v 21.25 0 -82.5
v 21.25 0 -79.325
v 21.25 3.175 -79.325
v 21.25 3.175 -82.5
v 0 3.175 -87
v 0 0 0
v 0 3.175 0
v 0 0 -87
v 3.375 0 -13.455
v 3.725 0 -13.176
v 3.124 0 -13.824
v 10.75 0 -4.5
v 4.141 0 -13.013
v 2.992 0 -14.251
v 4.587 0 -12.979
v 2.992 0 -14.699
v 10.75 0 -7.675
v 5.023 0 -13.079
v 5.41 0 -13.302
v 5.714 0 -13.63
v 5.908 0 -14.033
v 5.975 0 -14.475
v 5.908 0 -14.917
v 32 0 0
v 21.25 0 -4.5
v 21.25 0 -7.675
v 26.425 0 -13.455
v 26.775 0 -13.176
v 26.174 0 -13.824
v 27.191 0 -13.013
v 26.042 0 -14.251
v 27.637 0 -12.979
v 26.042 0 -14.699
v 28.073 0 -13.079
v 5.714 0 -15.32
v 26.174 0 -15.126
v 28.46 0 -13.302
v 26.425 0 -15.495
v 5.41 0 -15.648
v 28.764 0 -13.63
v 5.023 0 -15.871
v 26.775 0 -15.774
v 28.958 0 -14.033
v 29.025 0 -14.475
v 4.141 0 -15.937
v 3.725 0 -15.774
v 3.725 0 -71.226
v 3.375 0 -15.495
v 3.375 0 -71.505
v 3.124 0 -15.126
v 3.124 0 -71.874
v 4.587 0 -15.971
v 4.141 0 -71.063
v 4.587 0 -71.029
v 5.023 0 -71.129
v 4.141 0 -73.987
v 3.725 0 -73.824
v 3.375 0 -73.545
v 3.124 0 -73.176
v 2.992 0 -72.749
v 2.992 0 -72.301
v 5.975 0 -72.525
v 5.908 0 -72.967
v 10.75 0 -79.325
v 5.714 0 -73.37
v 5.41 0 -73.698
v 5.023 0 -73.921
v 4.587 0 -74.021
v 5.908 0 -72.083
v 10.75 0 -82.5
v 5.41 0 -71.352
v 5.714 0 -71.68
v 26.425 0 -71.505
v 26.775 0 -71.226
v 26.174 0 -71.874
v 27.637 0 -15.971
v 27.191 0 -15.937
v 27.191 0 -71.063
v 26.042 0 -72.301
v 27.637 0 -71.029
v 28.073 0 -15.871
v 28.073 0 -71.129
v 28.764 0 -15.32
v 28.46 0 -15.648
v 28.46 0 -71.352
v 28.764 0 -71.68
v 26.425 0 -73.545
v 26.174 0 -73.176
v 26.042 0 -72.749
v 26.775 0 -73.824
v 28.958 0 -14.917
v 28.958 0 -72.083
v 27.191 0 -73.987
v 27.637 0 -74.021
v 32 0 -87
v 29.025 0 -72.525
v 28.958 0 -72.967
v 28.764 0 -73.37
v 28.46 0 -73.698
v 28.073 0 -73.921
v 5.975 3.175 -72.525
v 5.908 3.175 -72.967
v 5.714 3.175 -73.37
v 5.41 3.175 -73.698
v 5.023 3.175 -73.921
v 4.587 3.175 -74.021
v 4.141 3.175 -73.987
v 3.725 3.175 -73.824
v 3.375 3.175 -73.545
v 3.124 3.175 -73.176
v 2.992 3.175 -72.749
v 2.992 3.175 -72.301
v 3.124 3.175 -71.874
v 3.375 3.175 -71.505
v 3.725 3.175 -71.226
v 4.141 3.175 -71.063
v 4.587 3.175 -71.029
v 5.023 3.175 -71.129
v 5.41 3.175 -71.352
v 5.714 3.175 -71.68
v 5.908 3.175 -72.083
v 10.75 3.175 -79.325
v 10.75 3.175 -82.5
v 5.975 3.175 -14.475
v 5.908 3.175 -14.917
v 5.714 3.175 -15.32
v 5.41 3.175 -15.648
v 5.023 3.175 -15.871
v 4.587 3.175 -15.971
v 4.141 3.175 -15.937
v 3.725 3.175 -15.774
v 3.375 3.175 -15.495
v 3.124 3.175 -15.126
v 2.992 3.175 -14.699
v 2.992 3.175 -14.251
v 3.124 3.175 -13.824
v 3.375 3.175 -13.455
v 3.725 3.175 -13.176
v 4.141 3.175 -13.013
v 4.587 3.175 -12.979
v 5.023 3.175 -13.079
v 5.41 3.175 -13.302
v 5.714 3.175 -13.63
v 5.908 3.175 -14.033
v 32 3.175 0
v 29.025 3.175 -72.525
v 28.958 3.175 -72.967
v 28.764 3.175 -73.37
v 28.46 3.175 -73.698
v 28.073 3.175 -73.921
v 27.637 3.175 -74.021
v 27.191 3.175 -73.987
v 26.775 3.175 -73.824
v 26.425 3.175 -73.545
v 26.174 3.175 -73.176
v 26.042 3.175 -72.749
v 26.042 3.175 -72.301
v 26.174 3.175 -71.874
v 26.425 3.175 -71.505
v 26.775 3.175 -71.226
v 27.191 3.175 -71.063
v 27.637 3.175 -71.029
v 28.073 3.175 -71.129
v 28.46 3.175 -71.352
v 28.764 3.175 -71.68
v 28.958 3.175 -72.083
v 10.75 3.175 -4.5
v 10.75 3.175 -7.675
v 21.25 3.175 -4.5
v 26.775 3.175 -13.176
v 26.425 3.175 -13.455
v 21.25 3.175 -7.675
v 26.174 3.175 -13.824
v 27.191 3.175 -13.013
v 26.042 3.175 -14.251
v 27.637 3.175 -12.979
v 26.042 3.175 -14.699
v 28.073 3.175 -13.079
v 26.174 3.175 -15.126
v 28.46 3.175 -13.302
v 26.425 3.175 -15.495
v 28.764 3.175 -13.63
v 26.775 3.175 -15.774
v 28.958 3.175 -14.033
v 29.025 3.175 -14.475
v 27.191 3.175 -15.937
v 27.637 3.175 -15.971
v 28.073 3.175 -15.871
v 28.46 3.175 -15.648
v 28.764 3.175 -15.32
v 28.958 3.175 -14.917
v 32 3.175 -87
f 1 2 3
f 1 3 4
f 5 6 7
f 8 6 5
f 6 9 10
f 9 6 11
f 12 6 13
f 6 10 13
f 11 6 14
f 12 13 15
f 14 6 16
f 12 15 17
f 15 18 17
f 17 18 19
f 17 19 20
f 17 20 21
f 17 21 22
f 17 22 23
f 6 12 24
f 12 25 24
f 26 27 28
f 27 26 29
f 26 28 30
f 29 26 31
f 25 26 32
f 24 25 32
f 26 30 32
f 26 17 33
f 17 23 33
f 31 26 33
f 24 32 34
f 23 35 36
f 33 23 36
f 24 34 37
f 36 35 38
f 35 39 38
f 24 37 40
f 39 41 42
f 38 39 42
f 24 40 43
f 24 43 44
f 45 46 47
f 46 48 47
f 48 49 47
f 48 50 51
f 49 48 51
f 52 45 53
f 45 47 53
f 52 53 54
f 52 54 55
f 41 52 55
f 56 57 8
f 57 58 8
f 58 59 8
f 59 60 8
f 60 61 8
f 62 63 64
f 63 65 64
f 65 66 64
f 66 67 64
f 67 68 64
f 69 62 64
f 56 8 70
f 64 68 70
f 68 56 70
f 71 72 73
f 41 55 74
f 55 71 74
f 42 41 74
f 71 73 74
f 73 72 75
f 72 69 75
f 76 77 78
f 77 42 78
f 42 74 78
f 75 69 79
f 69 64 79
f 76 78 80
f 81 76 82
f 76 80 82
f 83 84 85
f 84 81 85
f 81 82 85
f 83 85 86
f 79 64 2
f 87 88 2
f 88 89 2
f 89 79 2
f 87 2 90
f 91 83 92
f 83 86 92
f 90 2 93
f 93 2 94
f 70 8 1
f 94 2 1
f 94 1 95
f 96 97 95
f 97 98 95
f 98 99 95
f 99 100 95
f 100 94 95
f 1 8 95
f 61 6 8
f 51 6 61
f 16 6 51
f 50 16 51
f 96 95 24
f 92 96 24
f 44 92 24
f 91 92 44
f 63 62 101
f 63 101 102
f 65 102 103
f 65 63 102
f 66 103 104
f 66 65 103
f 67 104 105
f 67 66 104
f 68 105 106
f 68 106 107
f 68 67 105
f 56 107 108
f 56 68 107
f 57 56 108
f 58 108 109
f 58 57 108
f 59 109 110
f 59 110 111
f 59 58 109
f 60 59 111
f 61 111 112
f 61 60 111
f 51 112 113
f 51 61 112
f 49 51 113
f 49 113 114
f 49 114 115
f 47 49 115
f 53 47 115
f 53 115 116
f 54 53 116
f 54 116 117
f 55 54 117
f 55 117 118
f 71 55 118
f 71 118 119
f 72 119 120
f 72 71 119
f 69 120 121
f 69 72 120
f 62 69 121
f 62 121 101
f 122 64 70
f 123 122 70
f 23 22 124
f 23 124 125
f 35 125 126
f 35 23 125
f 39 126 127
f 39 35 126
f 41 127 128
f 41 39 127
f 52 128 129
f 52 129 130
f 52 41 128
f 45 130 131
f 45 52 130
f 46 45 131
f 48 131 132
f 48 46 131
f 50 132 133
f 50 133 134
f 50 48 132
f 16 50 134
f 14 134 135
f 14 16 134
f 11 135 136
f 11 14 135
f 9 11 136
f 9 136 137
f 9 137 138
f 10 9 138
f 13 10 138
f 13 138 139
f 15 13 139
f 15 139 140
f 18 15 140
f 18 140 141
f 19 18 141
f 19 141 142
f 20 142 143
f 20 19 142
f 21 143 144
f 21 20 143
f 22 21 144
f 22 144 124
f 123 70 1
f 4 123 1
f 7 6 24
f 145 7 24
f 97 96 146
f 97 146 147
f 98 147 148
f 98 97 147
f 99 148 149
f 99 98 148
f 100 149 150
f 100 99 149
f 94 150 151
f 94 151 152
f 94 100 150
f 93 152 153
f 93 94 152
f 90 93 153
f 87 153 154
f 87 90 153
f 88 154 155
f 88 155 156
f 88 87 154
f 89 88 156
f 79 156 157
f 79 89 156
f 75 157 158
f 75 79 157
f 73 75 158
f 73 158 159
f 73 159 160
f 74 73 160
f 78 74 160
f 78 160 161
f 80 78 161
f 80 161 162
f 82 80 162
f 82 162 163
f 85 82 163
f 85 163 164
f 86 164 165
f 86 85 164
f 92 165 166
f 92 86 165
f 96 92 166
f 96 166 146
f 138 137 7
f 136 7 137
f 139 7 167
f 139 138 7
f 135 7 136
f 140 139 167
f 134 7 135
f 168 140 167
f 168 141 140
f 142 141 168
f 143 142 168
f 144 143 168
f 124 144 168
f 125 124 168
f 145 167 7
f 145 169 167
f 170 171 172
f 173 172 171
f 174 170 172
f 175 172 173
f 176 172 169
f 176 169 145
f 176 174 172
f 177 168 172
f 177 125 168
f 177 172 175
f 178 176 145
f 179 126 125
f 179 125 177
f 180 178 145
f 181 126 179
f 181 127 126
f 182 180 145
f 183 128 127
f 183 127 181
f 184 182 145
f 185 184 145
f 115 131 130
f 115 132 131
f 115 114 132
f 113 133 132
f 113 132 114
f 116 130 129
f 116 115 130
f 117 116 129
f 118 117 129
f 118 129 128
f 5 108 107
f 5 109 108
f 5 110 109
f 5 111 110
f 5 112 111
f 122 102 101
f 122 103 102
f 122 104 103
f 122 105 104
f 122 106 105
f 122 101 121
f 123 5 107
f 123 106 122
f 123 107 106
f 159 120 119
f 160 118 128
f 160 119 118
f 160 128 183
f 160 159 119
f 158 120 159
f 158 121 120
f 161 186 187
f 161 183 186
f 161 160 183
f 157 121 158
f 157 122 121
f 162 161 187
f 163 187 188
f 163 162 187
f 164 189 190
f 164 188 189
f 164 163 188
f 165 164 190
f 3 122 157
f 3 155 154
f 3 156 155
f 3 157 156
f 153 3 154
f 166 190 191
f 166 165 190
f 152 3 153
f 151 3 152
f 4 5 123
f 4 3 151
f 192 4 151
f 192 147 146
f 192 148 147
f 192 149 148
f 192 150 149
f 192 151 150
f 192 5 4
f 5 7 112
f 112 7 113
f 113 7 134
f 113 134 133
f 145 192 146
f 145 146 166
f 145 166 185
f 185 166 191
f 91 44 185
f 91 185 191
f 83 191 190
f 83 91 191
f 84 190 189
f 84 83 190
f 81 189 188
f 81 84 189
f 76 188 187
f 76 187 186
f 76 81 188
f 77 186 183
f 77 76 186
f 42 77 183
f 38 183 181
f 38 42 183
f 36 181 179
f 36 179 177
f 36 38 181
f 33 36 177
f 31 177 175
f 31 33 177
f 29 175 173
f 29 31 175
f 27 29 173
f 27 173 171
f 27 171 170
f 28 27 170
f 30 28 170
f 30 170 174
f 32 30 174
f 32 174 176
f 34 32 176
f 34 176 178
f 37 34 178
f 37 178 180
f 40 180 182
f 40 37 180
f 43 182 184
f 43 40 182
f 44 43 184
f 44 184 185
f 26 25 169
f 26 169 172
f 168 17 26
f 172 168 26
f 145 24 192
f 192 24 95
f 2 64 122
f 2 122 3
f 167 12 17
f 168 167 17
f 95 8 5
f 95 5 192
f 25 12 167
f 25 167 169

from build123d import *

# Parameters (mm, degrees)
SKETCH1_W           = 32
SKETCH1_H           = 87
SKETCH1_R           = 1.5
SKETCH1_W_2         = 10.5
SKETCH1_H_2         = 3.175
BOSS_EXTRUDE1_DEPTH = 3.175


with BuildPart() as part:
    # Sketch1 → Boss-Extrude1 (new body)
    with BuildSketch(Plane(origin=(0, 0, 0), x_dir=(1, 0, 0), z_dir=(0, 1, 0))):
        with Locations((16, 43.5)):
            Rectangle(SKETCH1_W, SKETCH1_H)
        with Locations((4.475, 72.525)):
            Circle(SKETCH1_R, mode=Mode.SUBTRACT)
        with Locations((27.525, 72.525)):
            Circle(SKETCH1_R, mode=Mode.SUBTRACT)
        with Locations((27.525, 14.475)):
            Circle(SKETCH1_R, mode=Mode.SUBTRACT)
        with Locations((4.475, 14.475)):
            Circle(SKETCH1_R, mode=Mode.SUBTRACT)
        with Locations((16, 6.0875)):
            Rectangle(SKETCH1_W_2, SKETCH1_H_2, mode=Mode.SUBTRACT)
        with Locations((16, 80.9125)):
            Rectangle(SKETCH1_W_2, SKETCH1_H_2, mode=Mode.SUBTRACT)
    extrude(amount=BOSS_EXTRUDE1_DEPTH)


solid = part.part
